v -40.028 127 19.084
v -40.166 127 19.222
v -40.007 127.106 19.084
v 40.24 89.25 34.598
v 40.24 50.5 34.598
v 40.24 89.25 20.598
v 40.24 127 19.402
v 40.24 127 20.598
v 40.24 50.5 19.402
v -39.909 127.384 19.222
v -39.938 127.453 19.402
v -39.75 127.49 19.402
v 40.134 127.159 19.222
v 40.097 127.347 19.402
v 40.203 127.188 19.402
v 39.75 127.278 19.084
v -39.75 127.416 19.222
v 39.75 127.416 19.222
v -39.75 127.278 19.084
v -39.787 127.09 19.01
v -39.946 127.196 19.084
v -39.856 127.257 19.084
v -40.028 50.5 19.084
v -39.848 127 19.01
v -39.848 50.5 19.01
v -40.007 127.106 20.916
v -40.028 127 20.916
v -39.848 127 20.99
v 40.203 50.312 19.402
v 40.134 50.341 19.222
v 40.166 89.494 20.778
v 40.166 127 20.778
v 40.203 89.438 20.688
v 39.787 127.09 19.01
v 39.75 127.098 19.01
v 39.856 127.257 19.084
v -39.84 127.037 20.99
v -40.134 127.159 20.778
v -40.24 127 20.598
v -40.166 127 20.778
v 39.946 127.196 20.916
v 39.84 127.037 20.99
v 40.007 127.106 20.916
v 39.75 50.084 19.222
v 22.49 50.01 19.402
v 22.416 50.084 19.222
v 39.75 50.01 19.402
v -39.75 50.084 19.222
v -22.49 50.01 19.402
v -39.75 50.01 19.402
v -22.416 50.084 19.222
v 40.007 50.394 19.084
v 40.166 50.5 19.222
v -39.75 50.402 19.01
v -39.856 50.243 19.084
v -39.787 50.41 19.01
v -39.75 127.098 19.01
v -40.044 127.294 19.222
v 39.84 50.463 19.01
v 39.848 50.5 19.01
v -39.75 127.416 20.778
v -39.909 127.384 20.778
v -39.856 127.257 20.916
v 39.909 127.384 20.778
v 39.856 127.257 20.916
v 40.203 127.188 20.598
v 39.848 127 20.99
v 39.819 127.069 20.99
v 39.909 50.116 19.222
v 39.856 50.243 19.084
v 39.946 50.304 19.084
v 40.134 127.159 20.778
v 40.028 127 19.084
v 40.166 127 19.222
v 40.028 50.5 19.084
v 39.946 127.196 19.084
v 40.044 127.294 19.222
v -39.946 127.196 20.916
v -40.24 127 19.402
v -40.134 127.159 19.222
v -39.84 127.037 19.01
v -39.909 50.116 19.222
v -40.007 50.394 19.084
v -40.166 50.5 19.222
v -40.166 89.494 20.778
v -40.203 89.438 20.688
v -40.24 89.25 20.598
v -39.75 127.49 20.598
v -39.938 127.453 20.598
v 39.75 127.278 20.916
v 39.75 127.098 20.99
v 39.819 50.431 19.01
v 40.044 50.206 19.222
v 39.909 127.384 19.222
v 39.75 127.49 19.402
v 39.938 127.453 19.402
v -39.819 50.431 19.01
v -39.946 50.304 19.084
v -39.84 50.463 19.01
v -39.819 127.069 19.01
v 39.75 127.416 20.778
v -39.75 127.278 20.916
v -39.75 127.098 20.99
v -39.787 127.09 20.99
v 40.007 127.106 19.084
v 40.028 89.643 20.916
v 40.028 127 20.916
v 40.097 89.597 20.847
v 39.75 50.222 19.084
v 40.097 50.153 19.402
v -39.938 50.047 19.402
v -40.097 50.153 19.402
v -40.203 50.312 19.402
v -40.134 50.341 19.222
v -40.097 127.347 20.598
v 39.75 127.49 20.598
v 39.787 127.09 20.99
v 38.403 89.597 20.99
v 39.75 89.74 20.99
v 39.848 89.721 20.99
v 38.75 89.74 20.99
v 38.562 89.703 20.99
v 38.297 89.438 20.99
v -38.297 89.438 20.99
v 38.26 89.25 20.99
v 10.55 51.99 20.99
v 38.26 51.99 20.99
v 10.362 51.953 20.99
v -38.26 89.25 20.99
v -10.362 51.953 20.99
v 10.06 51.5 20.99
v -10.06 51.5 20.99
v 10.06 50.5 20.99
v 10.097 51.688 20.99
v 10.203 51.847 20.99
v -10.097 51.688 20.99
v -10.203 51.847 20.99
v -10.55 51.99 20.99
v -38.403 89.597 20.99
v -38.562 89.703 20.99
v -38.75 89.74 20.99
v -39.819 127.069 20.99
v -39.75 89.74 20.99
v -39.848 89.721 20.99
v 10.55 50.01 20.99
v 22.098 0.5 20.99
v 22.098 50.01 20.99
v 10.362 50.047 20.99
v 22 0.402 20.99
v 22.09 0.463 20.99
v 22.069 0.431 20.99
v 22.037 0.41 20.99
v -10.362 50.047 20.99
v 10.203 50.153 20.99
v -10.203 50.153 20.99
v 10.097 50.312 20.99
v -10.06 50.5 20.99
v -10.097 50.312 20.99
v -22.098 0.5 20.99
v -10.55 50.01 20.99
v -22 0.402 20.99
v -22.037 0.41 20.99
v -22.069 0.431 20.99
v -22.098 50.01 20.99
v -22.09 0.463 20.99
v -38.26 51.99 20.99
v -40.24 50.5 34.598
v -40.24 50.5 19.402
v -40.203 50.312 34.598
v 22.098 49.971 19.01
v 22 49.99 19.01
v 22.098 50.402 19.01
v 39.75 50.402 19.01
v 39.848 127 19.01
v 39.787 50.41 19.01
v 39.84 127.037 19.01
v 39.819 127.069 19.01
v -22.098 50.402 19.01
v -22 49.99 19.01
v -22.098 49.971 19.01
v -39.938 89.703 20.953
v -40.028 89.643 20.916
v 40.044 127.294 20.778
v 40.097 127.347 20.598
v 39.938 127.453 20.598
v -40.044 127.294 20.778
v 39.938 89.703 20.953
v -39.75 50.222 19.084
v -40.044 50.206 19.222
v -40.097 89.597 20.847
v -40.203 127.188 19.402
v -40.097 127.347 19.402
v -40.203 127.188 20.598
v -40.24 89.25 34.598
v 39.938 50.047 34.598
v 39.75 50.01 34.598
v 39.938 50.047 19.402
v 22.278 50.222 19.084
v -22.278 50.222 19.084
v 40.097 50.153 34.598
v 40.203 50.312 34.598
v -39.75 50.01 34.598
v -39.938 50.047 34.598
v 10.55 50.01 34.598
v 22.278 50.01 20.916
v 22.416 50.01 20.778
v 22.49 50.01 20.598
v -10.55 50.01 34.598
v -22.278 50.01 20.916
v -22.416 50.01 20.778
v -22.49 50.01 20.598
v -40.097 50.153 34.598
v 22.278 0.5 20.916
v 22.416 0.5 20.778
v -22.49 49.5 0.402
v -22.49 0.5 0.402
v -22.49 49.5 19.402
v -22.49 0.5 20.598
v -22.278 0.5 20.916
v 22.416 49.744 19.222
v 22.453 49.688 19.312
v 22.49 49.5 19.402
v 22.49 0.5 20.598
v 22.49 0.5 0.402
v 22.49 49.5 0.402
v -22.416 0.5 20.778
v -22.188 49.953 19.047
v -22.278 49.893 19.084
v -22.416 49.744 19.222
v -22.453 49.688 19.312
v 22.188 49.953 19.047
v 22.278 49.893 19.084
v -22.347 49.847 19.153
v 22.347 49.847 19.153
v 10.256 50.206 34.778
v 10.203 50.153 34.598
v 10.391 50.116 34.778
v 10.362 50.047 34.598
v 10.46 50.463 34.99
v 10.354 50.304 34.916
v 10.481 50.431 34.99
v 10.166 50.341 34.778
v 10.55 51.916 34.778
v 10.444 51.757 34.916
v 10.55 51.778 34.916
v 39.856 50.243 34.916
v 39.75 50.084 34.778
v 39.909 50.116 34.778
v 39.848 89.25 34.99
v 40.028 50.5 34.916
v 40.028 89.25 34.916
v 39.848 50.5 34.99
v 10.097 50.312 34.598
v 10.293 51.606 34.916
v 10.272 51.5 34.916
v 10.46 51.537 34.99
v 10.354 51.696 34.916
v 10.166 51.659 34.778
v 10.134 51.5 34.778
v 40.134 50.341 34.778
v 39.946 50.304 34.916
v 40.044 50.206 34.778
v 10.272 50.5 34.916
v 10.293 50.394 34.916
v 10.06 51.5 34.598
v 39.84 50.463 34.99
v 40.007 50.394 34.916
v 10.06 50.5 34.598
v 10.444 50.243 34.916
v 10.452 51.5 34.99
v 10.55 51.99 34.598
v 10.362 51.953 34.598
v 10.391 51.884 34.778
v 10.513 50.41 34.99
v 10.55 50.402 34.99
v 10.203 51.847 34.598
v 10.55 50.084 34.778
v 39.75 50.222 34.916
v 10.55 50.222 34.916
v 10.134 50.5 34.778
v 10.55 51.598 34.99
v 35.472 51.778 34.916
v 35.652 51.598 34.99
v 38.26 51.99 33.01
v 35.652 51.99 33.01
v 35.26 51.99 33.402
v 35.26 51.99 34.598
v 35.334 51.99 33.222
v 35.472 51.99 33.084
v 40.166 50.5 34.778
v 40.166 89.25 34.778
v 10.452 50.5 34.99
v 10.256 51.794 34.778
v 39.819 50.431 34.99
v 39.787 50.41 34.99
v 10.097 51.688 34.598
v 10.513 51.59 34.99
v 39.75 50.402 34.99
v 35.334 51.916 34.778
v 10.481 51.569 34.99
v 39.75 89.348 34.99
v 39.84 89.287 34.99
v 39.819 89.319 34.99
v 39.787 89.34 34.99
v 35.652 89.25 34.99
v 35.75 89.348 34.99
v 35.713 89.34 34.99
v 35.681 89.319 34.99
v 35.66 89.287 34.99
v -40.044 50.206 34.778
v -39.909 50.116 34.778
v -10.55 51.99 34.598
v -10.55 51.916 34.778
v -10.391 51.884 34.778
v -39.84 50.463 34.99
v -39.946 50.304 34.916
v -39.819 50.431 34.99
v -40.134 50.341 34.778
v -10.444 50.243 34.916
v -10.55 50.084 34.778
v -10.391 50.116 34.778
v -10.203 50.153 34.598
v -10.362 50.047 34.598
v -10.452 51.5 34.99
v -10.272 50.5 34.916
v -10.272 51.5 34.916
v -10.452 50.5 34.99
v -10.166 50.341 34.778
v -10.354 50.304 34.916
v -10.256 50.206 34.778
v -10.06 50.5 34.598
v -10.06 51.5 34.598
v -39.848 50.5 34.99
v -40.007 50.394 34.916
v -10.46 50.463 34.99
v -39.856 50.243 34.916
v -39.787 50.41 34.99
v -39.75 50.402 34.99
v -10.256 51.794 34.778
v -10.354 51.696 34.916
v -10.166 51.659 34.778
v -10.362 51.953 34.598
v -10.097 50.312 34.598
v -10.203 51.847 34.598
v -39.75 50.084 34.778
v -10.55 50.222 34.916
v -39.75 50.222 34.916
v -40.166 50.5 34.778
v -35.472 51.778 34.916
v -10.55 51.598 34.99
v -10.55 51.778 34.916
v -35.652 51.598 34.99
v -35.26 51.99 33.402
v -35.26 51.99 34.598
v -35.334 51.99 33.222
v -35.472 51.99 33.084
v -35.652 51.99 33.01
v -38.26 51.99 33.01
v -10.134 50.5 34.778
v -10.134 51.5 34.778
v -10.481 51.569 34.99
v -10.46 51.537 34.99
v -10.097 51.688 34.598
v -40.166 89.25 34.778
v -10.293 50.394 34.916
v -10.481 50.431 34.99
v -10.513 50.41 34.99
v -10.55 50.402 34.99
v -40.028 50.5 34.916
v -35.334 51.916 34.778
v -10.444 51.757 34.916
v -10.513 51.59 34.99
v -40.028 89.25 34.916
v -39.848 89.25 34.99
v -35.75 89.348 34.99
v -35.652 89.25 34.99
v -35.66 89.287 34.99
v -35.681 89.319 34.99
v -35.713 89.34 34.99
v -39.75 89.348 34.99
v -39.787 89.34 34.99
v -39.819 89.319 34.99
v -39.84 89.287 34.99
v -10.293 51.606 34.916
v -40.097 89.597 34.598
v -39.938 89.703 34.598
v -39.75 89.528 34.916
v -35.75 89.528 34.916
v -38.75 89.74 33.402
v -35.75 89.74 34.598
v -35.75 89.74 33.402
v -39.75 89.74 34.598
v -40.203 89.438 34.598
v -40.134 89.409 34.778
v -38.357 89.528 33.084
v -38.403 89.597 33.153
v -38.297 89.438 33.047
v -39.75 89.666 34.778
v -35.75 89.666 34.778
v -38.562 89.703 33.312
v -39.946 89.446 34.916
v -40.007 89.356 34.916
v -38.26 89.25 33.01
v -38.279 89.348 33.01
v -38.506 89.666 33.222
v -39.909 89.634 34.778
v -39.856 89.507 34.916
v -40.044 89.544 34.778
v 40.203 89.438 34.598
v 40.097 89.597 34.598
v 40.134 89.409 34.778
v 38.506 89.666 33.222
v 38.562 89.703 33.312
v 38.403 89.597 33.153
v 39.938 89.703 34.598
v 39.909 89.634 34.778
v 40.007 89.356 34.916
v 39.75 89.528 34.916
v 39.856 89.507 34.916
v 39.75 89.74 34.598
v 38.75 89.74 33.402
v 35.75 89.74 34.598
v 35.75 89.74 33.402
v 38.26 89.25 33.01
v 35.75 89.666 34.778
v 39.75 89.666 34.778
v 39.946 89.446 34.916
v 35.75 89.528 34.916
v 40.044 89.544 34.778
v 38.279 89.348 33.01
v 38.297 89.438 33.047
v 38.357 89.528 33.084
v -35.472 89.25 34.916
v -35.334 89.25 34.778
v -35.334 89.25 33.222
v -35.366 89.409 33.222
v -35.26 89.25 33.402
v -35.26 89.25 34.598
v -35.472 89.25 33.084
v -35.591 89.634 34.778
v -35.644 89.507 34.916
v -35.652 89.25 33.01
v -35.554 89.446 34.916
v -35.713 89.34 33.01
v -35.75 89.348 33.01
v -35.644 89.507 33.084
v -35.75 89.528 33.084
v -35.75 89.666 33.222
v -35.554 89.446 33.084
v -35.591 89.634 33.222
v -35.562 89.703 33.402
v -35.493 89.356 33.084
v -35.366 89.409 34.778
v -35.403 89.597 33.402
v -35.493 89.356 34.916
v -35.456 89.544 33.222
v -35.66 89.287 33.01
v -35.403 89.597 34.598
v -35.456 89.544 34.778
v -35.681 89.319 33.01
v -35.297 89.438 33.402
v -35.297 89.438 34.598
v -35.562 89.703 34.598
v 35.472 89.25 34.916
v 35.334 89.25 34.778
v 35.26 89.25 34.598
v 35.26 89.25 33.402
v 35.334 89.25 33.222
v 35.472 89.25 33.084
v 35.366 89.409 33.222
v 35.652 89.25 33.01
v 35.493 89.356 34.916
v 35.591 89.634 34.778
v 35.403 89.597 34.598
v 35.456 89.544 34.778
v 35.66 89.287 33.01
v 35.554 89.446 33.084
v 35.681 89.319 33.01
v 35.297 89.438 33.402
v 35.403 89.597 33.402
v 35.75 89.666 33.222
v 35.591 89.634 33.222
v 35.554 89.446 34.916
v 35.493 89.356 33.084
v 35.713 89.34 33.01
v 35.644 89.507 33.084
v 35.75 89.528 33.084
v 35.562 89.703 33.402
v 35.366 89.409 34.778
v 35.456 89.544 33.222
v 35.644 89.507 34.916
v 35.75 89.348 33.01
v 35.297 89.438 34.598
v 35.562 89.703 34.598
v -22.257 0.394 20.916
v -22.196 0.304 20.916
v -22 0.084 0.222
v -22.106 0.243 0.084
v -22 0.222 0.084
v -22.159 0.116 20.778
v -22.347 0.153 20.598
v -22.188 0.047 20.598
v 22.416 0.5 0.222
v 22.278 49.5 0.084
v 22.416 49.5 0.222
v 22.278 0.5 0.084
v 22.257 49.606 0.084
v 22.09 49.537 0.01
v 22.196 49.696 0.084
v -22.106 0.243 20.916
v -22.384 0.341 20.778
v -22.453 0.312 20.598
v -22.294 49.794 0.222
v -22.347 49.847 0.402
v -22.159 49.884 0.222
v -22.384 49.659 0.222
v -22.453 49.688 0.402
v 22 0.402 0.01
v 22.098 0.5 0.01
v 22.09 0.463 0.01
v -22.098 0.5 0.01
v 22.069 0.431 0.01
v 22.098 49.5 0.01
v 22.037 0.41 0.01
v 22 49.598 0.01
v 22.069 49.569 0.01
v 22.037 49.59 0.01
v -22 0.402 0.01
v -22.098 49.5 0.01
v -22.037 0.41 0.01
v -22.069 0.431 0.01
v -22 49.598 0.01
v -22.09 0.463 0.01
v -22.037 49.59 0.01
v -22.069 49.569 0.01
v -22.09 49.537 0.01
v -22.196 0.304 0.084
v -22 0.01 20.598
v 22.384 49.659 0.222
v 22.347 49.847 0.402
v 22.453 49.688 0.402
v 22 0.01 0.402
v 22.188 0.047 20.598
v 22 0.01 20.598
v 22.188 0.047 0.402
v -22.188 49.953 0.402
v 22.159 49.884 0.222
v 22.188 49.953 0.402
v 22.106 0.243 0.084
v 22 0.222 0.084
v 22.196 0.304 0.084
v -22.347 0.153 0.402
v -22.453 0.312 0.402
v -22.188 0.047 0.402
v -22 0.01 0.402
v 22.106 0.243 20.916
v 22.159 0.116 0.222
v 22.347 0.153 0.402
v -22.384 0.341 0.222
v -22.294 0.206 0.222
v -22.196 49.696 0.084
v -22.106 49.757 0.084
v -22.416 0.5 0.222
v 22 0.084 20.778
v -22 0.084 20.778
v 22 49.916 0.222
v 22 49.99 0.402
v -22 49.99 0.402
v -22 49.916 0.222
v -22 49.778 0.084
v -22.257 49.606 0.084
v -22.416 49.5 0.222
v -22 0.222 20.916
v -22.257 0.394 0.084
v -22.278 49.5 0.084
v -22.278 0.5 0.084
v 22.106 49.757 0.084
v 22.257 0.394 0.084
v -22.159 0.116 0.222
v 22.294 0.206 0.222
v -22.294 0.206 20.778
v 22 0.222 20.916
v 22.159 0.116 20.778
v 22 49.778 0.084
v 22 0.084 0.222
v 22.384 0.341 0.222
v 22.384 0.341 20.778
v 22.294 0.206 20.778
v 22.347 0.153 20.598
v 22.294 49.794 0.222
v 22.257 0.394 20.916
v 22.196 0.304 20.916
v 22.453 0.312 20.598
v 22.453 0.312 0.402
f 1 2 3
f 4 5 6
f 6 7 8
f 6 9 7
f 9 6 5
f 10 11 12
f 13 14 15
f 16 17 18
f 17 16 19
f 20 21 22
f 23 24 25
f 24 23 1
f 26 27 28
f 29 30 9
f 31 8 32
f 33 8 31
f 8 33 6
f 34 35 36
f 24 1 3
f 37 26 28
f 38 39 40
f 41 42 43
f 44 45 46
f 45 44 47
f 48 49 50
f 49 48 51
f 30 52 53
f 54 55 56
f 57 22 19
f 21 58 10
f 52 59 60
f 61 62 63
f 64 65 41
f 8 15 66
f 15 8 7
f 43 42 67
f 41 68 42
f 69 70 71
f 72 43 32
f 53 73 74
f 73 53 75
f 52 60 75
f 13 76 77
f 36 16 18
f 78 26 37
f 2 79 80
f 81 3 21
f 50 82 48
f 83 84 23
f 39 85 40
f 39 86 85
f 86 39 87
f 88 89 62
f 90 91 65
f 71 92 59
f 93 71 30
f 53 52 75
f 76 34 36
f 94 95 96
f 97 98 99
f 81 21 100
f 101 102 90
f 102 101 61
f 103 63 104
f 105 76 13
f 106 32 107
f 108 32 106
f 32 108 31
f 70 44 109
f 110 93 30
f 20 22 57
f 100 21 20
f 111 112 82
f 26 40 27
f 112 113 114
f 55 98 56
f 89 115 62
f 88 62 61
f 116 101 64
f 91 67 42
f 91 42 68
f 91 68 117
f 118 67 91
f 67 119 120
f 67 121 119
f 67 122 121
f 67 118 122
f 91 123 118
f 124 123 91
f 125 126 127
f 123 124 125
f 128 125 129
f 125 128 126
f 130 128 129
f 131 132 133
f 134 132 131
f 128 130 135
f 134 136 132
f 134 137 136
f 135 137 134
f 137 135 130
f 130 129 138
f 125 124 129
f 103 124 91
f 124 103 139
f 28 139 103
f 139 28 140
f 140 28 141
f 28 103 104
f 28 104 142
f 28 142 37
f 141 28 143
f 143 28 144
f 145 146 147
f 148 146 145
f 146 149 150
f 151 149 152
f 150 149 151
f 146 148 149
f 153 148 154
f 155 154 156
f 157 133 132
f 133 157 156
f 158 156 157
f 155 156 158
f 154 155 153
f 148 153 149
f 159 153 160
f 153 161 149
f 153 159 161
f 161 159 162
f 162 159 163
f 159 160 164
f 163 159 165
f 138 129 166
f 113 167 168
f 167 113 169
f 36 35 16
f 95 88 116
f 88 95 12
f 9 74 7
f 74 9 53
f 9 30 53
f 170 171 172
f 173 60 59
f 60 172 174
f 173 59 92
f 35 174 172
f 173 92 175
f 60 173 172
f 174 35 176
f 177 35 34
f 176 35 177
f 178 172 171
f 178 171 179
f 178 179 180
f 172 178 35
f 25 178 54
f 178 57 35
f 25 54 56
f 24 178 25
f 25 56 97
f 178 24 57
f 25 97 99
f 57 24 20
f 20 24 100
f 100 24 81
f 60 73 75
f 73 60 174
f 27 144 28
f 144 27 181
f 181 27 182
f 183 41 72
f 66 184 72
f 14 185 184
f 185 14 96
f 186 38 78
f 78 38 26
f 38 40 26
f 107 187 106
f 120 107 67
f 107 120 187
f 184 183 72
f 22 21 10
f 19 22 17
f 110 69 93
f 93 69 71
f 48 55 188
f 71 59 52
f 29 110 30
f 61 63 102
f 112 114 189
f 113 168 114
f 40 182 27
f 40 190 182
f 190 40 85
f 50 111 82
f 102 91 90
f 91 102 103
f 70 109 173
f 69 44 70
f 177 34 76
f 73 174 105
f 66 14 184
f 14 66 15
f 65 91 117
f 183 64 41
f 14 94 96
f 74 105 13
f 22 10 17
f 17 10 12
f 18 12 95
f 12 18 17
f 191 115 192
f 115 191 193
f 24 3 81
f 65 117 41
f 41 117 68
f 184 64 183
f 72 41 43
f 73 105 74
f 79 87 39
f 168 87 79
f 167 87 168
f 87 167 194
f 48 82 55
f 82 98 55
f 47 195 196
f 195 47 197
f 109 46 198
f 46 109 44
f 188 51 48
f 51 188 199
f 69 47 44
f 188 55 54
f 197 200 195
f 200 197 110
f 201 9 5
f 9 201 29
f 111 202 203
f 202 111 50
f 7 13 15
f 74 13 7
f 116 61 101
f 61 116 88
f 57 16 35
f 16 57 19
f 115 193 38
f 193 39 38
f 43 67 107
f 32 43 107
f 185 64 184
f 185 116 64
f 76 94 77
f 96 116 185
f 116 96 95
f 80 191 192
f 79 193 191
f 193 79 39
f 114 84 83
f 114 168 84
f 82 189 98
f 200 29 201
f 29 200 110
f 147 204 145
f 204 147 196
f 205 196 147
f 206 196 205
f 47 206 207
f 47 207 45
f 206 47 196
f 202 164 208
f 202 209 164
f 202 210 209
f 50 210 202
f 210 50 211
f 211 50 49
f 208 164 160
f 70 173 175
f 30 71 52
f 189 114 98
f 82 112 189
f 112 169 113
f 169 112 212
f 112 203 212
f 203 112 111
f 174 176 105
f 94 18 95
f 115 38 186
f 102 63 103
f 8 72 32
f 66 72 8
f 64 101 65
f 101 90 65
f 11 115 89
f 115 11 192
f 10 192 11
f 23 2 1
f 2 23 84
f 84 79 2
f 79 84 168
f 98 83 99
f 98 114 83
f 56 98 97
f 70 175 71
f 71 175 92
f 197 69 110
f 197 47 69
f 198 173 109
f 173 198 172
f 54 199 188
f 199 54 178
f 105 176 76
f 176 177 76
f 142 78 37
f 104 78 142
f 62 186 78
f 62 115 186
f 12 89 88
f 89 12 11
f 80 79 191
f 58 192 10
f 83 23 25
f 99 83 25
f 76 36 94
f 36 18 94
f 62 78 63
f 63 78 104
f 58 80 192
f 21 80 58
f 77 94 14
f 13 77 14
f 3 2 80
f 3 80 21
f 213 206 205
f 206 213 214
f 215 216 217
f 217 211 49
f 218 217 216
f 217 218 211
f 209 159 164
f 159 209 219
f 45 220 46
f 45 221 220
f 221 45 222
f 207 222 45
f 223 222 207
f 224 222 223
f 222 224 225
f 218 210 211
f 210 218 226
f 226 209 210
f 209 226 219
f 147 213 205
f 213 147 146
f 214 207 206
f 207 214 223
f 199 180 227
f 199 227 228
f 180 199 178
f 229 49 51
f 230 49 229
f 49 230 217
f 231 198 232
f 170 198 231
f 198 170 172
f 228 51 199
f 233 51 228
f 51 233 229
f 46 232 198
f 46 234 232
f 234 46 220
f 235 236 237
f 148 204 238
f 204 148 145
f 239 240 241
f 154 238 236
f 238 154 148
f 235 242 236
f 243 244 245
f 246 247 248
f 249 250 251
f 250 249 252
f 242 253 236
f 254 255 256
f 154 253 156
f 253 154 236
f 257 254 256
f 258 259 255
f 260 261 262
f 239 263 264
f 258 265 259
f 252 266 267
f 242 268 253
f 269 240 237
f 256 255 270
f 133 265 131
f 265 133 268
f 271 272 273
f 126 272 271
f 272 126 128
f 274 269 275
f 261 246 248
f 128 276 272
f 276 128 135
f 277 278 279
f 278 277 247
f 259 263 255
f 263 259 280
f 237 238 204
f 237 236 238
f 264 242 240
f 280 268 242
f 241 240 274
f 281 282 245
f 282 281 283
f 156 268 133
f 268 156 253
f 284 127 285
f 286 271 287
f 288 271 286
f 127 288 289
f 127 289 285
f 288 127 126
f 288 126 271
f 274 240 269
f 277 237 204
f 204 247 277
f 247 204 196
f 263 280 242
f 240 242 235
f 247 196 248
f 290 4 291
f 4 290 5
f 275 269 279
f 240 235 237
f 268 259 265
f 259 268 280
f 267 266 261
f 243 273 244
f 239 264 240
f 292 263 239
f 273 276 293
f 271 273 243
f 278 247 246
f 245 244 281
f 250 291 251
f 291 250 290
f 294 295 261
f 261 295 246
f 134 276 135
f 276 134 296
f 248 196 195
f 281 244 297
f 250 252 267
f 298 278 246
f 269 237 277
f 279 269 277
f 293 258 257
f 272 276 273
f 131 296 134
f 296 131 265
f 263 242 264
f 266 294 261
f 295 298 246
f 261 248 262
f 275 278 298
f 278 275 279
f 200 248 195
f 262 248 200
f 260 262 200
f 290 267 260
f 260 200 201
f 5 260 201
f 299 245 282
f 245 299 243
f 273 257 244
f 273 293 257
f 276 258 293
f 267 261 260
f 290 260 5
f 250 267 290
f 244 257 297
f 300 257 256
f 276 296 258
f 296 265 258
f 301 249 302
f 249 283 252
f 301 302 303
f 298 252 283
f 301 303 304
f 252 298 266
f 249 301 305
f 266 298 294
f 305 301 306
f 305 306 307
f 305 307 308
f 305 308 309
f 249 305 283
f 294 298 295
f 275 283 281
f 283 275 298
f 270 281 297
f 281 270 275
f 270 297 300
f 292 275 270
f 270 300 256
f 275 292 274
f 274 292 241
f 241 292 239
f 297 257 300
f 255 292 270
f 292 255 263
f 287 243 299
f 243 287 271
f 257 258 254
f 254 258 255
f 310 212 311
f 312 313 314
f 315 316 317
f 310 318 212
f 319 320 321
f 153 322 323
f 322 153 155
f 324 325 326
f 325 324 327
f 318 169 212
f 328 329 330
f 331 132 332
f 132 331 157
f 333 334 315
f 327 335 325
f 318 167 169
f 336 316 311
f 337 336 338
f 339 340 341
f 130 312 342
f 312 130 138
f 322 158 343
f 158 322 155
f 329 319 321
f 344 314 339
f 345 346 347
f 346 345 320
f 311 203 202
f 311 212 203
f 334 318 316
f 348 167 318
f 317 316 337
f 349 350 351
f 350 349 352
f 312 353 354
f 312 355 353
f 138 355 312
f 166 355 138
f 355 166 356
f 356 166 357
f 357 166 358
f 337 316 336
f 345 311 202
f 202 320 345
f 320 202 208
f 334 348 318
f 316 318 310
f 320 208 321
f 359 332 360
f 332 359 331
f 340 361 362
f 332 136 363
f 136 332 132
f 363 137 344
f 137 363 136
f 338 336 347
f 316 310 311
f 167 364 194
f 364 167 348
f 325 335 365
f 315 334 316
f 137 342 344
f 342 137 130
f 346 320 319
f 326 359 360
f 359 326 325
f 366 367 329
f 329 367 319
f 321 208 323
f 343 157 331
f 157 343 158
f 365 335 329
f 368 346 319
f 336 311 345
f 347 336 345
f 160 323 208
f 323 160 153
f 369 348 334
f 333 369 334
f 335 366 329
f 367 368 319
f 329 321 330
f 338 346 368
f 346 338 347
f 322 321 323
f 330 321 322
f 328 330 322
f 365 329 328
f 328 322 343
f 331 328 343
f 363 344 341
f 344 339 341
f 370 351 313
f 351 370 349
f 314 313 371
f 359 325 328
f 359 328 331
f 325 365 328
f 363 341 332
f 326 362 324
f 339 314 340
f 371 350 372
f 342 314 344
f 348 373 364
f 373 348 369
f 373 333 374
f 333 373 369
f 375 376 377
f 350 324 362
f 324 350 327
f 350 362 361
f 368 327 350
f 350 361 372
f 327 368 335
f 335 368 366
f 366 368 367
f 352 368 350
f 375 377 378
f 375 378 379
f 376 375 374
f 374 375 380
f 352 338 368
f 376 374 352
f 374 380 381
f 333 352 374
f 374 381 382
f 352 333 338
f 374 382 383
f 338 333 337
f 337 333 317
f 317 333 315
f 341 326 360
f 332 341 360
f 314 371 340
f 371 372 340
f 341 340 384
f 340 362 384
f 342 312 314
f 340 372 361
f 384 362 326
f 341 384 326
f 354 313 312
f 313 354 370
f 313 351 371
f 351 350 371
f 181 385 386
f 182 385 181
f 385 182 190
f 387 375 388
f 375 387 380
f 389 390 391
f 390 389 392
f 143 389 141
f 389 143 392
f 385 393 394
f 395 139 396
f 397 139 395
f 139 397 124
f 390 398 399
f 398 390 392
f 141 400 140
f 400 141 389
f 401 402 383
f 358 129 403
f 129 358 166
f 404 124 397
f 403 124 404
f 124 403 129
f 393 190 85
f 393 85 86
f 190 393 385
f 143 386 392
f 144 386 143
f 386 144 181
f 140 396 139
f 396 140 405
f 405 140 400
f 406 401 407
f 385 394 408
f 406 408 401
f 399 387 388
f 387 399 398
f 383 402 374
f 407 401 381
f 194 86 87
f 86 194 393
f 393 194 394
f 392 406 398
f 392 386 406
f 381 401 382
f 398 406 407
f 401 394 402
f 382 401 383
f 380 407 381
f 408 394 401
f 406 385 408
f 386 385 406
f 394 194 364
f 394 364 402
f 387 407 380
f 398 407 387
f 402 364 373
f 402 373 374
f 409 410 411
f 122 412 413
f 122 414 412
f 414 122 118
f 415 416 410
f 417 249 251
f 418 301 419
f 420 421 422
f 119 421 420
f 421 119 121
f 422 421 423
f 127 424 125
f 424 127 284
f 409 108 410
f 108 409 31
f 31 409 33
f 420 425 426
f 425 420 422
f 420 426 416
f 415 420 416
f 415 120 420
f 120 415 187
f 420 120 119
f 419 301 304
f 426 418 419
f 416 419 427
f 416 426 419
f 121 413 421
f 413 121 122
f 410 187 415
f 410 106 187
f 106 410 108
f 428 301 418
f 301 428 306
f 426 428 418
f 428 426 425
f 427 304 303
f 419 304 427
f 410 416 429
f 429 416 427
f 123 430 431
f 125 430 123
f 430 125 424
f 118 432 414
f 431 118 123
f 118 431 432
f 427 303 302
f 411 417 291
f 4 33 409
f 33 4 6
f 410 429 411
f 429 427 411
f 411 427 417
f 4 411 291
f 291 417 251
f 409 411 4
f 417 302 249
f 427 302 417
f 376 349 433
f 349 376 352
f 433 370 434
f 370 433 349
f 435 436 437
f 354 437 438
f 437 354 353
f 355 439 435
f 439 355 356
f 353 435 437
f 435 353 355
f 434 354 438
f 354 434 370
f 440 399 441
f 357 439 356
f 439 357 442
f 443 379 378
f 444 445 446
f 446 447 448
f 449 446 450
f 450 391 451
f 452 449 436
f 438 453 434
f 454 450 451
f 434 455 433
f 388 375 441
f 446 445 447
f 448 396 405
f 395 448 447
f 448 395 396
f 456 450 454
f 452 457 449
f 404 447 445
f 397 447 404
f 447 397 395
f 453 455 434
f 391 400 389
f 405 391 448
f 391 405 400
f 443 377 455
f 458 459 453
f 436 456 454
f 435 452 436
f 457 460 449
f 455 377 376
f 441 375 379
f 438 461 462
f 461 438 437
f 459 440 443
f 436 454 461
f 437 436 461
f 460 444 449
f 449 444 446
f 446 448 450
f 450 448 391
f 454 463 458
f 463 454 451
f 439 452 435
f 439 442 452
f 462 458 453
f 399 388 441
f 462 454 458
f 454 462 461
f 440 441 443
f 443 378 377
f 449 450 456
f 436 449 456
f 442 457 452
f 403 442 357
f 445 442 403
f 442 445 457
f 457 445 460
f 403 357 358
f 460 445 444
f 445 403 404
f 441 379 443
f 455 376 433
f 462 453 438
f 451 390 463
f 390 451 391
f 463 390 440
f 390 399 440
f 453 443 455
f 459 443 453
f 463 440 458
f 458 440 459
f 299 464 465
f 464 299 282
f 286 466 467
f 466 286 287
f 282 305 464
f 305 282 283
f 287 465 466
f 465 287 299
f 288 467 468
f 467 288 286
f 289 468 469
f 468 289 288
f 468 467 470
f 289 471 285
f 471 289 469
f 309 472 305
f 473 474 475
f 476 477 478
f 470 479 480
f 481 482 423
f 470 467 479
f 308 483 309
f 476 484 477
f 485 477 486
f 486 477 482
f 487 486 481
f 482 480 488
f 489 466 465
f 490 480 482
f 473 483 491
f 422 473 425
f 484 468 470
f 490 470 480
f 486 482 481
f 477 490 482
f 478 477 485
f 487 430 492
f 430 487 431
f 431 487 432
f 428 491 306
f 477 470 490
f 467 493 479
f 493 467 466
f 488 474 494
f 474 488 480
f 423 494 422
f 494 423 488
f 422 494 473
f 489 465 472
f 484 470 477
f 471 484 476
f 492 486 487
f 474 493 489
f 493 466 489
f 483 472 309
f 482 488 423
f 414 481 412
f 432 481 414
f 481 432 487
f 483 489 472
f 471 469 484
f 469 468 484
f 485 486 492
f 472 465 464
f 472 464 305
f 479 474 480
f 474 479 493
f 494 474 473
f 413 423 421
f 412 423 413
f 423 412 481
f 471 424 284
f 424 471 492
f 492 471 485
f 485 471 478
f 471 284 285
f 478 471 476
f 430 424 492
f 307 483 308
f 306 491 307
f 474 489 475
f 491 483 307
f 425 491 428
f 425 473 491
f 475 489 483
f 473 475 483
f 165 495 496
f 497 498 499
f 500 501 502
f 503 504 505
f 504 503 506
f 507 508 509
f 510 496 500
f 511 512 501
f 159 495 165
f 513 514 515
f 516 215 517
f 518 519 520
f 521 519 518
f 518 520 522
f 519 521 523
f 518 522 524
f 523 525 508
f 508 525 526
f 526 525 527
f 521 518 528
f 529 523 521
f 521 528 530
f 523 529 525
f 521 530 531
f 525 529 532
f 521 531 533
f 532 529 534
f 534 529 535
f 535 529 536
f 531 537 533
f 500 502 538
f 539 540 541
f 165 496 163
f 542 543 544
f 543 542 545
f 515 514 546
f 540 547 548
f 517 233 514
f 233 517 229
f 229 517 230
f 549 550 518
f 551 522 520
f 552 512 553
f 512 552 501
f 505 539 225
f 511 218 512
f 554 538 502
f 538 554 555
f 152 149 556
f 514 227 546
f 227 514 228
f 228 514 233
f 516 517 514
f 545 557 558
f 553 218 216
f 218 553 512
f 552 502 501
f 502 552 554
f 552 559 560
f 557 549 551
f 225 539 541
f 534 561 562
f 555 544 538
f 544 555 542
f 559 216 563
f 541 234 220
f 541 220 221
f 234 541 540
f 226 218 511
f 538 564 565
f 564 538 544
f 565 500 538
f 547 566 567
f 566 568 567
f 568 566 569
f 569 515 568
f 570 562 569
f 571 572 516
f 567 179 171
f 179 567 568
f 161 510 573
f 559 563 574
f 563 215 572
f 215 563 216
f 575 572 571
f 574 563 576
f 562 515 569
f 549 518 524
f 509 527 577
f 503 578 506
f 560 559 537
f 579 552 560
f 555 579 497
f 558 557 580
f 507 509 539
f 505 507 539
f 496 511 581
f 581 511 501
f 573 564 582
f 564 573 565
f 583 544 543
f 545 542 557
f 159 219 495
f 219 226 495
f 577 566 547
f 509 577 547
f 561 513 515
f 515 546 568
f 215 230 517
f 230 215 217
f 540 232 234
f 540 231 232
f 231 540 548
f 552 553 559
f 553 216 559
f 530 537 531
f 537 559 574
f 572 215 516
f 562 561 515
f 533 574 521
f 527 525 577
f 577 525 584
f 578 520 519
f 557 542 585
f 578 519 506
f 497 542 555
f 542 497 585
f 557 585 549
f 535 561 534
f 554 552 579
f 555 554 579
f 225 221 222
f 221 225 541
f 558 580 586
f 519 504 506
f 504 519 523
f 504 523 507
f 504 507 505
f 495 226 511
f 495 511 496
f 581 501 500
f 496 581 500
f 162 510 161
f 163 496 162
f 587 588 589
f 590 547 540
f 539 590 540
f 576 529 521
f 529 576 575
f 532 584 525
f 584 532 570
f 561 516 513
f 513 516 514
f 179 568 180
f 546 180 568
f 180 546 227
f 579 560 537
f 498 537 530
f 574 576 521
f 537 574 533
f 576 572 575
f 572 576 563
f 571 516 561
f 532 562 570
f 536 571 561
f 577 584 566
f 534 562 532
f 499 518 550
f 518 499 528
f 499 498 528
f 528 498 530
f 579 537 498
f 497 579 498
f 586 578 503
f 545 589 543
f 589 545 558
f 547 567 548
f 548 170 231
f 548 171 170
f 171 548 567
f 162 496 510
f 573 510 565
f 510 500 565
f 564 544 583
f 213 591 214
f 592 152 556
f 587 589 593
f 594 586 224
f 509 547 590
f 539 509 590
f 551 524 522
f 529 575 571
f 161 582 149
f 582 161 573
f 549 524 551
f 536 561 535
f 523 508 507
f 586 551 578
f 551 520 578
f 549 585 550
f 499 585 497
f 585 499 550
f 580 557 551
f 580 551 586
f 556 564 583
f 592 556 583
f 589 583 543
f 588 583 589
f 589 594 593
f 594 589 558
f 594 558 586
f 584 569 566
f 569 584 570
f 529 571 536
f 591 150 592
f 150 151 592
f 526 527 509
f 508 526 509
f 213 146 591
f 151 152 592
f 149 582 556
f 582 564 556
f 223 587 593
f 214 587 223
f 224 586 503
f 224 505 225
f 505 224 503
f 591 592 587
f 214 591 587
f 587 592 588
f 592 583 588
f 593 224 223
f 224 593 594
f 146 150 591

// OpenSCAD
$fn = 16;
debug=true;

module roundedCube(xdim, ydim, zdim, rdim) {
  hull() {
    translate([rdim,rdim,rdim]) sphere(r=rdim);
    translate([xdim-rdim,rdim,rdim]) sphere(r=rdim);
    translate([rdim,ydim-rdim,rdim]) sphere(r=rdim);
    translate([xdim-rdim,ydim-rdim,rdim]) sphere(r=rdim);
    translate([rdim,rdim,zdim-rdim]) sphere(r=rdim);
    translate([xdim-rdim,rdim,zdim-rdim]) sphere(r=rdim);
    translate([rdim,ydim-rdim,zdim-rdim]) sphere(r=rdim);
    translate([xdim-rdim,ydim-rdim,zdim-rdim]) sphere(r=rdim);
  }
};

if (debug) {
    echo(base_x=base_x);
    echo(base_y=base_y);
    echo(base_z=base_z);
    echo(back_plate_x=back_plate_x);
    echo(phone_y=phone_y);
    echo(back_plate_y=back_plate_y);
    echo(back_plate_z=back_plate_z);
}

rounded_corners=0.5;

base_x=45;
base_y=50;
base_z=21;
module baseTab() {
    // baseTab
    translate([-base_x/2,0,0]) roundedCube(base_x, base_y, base_z, rounded_corners);
}

wall=2;
wiggle=1;
phone_x=75.5;
phone_y=151;
phone_z=11;

back_plate_x=phone_x+wiggle+2*wall;
back_plate_y=phone_y/2+wall;
back_plate_z=wall;
module backPlate() {
    back_plate_z_offset=base_z-wall;
    // backPlate
    translate([-back_plate_x/2,base_y,back_plate_z_offset]) roundedCube(back_plate_x, back_plate_y, back_plate_z, rounded_corners);
    // overlap between baseTab and backPlate
    translate([-base_x/2,base_y-1,back_plate_z_offset]) roundedCube(base_x, 2, back_plate_z, rounded_corners);
}

shelf_plate_x=2/5*phone_x;
shelf_plate_y=wall;
shelf_plate_z=phone_z+wiggle+2*wall;
module shelfPlate() {
    shelf_plate1_x_offset=back_plate_x/2-shelf_plate_x;
    shelf_plate2_x_offset=-back_plate_x/2;
    shelf_plate_y_offset=base_y;
    shelf_plate_z_offset=base_z-wall;
    translate([shelf_plate1_x_offset,shelf_plate_y_offset,shelf_plate_z_offset]) roundedCube(shelf_plate_x, shelf_plate_y, shelf_plate_z, rounded_corners);
    translate([shelf_plate2_x_offset,shelf_plate_y_offset,shelf_plate_z_offset]) roundedCube(shelf_plate_x, shelf_plate_y, shelf_plate_z, rounded_corners);
}

side_plate_x=wall;
side_plate_y=phone_y/4+wall;
side_plate_z=phone_z+wiggle+2*wall;
module sidePlates() {
    side_plate1_x_offset=-back_plate_x/2;
    side_plate2_x_offset=back_plate_x/2-wall;
    side_plate_y_offset=base_y;
    side_plate_z_offset=base_z-wall;
    translate([side_plate1_x_offset,side_plate_y_offset,side_plate_z_offset]) roundedCube(side_plate_x, side_plate_y, side_plate_z, rounded_corners);
    translate([side_plate2_x_offset,side_plate_y_offset,side_plate_z_offset]) roundedCube(side_plate_x, side_plate_y, side_plate_z, rounded_corners);
}

thumb_plate_x=5;
thumb_plate_y=phone_y/4+wall;
thumb_plate_z=wall;
module fauxThumbs() {
    thumb_plate1_x_offset=-back_plate_x/2;
    thumb_plate2_x_offset=back_plate_x/2-thumb_plate_x;
    thumb_plate_y_offset=base_y;
    thumb_plate_z_offset=base_z+phone_z+wiggle;
    translate([thumb_plate1_x_offset,thumb_plate_y_offset,thumb_plate_z_offset]) roundedCube(thumb_plate_x, thumb_plate_y, thumb_plate_z, rounded_corners);
    translate([thumb_plate2_x_offset,thumb_plate_y_offset,thumb_plate_z_offset]) roundedCube(thumb_plate_x, thumb_plate_y, thumb_plate_z, rounded_corners);
}

module phoneGrip() {
    backPlate();
    shelfPlate();
    sidePlates();
    fauxThumbs();
}

module complete() {
    baseTab();
    phoneGrip();
}

complete();
